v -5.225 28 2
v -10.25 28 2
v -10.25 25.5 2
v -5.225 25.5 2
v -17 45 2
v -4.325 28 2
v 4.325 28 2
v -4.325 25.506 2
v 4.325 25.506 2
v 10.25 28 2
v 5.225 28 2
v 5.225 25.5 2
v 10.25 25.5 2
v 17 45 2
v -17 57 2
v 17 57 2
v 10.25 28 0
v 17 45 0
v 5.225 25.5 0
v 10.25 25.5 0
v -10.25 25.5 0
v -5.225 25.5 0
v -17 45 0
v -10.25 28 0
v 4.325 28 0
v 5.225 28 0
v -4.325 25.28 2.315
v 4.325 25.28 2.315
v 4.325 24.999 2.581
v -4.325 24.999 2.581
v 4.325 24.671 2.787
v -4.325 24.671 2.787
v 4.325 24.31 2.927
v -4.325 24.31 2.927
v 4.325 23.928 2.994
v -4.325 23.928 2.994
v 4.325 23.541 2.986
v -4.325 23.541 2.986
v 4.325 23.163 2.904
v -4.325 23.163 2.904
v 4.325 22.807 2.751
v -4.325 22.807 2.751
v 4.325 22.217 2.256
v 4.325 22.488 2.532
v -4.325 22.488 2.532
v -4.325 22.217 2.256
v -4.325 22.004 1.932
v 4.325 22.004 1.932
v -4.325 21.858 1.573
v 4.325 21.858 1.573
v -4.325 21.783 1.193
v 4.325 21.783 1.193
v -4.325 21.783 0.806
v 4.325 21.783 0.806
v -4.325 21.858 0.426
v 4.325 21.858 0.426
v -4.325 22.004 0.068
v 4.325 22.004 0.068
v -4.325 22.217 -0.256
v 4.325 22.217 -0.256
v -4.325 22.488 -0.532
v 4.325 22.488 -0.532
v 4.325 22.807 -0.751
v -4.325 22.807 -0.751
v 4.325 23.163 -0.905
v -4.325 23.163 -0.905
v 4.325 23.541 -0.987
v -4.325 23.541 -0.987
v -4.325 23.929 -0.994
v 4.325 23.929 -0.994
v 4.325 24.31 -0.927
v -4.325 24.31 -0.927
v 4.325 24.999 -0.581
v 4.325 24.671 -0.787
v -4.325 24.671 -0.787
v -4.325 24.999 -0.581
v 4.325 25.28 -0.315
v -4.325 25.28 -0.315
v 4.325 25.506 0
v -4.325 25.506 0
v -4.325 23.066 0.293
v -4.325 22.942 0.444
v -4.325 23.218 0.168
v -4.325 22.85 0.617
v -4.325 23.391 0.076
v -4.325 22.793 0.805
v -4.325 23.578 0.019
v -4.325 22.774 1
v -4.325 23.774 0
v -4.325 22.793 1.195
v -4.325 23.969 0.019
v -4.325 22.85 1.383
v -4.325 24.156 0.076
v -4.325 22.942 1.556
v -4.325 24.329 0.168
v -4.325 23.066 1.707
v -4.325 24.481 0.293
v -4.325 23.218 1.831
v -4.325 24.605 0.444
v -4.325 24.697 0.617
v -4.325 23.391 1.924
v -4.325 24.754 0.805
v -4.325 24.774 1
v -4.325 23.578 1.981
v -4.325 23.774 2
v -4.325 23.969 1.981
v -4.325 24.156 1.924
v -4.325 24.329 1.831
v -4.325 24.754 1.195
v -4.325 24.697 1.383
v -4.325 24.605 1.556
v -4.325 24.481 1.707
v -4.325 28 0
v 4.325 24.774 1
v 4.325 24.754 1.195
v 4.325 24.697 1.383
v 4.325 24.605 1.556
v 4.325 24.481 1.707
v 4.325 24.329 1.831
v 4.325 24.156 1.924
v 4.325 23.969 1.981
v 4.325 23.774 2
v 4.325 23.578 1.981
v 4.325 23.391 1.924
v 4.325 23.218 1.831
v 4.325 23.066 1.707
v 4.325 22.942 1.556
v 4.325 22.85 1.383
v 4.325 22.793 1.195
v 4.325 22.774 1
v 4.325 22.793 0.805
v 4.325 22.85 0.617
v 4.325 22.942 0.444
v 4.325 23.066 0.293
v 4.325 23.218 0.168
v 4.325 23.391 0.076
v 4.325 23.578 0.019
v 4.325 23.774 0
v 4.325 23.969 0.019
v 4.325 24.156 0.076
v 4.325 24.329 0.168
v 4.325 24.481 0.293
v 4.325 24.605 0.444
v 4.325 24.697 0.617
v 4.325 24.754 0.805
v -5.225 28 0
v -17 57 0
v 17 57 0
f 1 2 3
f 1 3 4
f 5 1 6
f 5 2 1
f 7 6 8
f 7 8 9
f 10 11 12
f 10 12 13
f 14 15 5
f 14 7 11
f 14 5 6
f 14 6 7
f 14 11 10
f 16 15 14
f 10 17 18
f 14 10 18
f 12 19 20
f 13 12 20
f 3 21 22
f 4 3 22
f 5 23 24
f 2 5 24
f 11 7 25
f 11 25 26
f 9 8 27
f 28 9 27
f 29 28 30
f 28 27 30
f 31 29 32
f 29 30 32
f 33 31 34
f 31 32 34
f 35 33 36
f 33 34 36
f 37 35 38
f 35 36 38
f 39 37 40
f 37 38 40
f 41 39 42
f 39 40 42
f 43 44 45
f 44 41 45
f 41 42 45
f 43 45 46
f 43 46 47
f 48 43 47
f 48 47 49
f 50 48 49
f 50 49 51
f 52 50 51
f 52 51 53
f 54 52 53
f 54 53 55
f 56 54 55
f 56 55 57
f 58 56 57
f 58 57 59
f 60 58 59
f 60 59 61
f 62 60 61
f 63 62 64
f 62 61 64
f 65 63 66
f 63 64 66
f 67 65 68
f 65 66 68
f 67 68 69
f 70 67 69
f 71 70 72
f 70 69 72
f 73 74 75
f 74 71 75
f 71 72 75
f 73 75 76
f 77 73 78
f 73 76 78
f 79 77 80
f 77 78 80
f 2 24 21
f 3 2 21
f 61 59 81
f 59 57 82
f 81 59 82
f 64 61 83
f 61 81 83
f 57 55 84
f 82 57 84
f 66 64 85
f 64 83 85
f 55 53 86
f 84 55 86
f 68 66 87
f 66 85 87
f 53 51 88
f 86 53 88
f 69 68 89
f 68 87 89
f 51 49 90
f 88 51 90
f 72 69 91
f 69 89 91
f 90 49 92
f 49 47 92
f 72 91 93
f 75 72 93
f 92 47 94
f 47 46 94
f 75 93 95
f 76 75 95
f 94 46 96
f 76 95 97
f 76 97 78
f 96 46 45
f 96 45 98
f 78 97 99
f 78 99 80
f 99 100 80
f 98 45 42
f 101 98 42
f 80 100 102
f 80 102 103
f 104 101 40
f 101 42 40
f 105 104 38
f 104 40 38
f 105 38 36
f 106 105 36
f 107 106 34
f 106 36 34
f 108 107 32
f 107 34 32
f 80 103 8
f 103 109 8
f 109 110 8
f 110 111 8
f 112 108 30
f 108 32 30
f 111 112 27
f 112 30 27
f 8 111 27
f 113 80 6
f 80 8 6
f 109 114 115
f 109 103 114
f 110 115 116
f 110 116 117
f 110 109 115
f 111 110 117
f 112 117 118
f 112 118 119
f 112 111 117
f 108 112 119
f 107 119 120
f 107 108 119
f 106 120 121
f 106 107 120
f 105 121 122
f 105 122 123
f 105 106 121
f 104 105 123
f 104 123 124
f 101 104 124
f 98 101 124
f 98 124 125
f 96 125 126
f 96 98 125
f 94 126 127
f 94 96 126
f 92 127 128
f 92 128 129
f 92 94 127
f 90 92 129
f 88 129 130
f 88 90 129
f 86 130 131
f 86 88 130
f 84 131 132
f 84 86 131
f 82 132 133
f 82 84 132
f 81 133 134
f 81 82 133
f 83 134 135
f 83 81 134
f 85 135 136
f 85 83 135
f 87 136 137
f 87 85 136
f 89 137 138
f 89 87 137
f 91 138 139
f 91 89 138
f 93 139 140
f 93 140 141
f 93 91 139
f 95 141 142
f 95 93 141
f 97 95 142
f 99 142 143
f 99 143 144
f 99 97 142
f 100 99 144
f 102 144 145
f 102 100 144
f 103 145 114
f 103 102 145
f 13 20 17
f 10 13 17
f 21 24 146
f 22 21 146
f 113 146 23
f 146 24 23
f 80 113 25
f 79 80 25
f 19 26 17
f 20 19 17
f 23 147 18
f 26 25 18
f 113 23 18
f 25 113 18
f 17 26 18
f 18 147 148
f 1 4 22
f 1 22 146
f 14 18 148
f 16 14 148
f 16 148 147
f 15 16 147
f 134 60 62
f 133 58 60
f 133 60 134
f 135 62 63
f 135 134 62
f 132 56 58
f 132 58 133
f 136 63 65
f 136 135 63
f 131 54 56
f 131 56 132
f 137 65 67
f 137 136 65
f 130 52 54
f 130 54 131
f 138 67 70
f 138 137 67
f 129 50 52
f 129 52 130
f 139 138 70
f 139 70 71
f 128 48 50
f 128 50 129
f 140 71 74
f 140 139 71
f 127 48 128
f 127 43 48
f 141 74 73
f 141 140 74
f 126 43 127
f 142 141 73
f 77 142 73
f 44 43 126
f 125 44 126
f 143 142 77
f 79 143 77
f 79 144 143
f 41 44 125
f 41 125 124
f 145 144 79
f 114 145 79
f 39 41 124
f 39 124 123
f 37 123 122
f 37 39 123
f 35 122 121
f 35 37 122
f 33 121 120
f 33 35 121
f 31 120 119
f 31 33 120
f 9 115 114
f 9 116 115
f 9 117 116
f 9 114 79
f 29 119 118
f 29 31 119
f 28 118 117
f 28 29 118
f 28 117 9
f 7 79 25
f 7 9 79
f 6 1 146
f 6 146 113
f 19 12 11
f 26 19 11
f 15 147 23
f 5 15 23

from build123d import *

# Parameters (mm, degrees)
F1_DEPTH      = 2
F2_R          = 2.0000003278
F2_R_2        = 1
F3_DEPTH      = 4.325
F3_DEPTH_BACK = 4.325
F4_W          = 0.9
F4_H          = 2.5
F5_DEPTH      = 3.0010606999


with BuildPart() as f1:
    # F0 (on Top) → F1 (new body)
    with BuildSketch(Plane.XY):
        Polygon((-10.25, 25.5), (0, 25.5), (10.25, 25.5), (10.25, 28), (0, 28), (-10.25, 28), align=None)
        Polygon((-17, 45), (-10.25, 28), (0, 28), (10.25, 28), (17, 45), (0, 45), align=None)
        Polygon((-17, 57), (-17, 45), (0, 45), (17, 45), (17, 57), (0, 57), align=None)
    extrude(amount=F1_DEPTH)

    # F2 (on Right) → F3 (join, two sides)
    with BuildSketch(Plane.YZ) as f3_sk:
        with Locations((23.7735025585, 0.9999396279)):
            Circle(F2_R)
        with Locations((23.7735025585, 0.9999396279)):
            Circle(F2_R_2, mode=Mode.SUBTRACT)
    extrude(amount=-F3_DEPTH)
    extrude(f3_sk.sketch, amount=F3_DEPTH_BACK)

    # F4 (on face) → F5 (cut, through all)
    with BuildSketch(Plane.XY.offset(2)):
        with Locations((4.775, 26.75)):
            Rectangle(F4_W, F4_H)
        with Locations((-4.775, 26.75)):
            Rectangle(F4_W, F4_H)
    extrude(amount=-F5_DEPTH, mode=Mode.SUBTRACT)


solid = f1.part
